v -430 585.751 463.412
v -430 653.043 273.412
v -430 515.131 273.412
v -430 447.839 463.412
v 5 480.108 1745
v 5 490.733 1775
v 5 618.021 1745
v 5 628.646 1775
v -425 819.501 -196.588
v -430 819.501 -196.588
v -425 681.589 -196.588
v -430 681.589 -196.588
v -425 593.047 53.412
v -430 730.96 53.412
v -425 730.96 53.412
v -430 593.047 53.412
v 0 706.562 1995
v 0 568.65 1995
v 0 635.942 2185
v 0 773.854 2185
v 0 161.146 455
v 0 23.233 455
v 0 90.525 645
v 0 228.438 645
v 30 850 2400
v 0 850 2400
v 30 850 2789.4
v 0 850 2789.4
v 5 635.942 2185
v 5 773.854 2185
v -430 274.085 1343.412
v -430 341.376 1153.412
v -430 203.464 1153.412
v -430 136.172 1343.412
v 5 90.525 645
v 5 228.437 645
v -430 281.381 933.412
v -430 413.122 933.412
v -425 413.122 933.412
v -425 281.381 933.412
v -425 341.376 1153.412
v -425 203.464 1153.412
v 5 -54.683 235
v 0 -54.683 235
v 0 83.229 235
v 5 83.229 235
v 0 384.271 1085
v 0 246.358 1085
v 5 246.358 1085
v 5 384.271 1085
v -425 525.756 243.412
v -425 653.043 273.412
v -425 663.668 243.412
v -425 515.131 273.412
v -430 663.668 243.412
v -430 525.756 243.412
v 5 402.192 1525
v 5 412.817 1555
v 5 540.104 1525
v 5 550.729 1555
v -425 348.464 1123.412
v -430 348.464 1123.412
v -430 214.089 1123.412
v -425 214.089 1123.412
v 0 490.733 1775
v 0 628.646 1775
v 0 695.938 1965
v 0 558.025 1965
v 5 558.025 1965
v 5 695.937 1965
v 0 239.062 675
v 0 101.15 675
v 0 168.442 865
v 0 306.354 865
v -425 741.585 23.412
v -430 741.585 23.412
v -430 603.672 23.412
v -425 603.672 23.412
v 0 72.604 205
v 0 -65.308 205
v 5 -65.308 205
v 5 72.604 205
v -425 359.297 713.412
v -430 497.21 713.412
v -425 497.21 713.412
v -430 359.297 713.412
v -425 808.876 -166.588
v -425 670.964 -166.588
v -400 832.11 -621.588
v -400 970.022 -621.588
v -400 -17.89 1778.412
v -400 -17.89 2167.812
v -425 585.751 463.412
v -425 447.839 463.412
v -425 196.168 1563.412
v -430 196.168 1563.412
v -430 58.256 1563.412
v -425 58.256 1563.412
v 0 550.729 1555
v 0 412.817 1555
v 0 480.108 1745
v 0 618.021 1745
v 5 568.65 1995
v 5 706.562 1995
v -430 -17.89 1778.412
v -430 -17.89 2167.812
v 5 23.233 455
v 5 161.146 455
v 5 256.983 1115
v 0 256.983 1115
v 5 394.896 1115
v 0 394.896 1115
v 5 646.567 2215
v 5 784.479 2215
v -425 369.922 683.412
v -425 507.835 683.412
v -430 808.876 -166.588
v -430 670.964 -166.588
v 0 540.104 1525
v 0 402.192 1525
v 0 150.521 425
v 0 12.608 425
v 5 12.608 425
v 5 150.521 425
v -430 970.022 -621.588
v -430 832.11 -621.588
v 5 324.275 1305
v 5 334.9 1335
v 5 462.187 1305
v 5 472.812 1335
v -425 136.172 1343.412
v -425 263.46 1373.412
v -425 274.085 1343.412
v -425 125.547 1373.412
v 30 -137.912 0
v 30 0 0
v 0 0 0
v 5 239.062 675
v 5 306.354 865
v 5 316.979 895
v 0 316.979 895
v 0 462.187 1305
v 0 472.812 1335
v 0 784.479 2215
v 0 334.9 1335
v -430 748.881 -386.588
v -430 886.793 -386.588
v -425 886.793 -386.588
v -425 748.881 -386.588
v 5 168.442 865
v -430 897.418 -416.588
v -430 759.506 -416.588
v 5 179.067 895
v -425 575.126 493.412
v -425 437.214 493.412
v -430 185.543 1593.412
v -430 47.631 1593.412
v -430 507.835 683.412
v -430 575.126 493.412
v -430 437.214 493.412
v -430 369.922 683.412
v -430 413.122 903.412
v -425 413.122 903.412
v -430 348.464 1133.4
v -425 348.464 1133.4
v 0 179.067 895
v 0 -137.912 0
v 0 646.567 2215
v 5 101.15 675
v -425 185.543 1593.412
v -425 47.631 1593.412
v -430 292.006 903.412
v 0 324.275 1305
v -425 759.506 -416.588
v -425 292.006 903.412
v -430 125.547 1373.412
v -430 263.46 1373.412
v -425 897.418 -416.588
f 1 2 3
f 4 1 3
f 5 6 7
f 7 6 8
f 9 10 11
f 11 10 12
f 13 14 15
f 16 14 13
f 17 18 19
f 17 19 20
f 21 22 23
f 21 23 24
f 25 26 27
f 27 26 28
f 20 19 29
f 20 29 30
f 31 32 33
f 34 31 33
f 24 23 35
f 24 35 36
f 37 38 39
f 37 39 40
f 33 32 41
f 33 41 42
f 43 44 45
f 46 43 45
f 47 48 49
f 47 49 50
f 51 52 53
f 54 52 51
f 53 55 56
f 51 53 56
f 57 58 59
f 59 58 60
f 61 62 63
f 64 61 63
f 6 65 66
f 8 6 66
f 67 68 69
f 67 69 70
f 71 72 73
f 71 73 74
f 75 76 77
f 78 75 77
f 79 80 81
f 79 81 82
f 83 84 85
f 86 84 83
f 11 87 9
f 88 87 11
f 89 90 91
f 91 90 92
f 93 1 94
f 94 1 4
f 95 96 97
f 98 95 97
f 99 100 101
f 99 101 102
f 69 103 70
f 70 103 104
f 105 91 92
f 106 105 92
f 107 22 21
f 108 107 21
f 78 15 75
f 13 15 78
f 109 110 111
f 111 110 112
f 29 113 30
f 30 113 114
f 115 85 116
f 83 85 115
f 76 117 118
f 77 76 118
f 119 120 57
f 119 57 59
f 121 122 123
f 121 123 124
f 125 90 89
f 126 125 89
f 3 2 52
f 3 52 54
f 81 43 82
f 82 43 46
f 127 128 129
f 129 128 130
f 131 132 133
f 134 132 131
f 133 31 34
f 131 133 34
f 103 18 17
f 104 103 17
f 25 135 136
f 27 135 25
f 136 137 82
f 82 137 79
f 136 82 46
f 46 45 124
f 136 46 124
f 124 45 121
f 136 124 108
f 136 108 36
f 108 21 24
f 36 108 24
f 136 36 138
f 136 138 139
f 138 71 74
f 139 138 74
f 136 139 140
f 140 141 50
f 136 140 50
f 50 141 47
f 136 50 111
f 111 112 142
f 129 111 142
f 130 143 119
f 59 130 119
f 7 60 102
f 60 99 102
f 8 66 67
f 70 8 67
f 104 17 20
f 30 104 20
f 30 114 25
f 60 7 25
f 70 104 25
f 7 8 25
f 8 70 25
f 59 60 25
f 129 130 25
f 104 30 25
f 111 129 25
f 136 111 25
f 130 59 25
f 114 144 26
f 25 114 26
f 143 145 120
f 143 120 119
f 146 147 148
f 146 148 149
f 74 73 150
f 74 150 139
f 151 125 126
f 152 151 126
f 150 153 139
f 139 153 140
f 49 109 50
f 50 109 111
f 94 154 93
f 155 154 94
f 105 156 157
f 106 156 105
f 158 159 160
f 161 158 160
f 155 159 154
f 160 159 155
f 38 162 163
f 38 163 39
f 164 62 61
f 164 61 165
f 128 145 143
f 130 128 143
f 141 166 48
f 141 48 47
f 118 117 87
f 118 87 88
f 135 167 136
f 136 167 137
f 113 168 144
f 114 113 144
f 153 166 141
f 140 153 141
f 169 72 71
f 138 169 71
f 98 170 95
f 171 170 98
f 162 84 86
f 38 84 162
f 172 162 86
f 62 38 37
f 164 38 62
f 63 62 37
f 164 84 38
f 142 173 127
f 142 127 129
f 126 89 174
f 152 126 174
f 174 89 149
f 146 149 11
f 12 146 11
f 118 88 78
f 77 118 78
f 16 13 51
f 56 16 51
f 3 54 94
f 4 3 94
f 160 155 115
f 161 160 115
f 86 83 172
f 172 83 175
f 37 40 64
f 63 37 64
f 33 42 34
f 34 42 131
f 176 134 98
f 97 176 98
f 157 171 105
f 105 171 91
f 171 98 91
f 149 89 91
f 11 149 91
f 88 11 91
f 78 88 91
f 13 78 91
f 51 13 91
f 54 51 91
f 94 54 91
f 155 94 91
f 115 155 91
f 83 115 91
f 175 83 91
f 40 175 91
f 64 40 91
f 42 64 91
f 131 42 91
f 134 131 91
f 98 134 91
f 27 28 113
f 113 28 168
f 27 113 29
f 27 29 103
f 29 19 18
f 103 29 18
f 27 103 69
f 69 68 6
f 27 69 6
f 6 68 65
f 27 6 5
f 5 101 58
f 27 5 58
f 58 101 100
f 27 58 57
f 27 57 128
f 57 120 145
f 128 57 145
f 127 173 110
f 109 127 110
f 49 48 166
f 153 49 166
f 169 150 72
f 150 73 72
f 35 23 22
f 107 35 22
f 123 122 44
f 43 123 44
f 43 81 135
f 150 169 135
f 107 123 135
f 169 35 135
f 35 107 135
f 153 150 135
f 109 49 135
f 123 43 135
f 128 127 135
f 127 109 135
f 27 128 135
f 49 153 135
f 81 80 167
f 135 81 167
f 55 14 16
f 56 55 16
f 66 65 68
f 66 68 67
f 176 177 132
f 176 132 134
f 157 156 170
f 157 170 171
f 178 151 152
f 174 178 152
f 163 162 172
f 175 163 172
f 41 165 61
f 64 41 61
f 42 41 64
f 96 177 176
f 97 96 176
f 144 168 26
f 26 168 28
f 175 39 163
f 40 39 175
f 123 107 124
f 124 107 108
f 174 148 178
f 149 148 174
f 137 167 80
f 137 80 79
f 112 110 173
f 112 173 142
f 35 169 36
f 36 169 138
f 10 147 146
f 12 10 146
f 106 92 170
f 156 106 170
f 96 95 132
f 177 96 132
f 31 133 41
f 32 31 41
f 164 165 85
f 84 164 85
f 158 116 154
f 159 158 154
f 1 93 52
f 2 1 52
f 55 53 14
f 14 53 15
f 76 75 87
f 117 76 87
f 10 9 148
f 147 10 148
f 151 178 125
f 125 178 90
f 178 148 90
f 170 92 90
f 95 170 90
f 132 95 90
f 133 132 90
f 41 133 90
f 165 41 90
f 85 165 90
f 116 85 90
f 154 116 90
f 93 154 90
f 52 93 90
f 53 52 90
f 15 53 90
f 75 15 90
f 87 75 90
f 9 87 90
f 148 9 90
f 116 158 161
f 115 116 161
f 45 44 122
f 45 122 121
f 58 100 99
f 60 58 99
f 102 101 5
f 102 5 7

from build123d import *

# Parameters (mm, degrees)
F1_DEPTH  = 30
F2_W      = 250
F2_H      = 30
F2_W_2    = 234.575457871
F2_W_3    = 192.9415017366
F2_W_4    = 210.5176895857
F2_W_5    = 378.7932693958
F2_W_6    = 369.8027133942
F2_W_7    = 339.6961390972
F2_W_8    = 379.8424005508
F2_W_9    = 261.5640759468
F3_DEPTH  = 5
F6_DEPTH  = 30
F7_W      = 250
F7_H      = 30
F7_W_2    = 422.9962933395
F7_W_3    = 476.137507293
F7_W_4    = 411.4778074953
F7_W_5    = 423.6617717478
F7_W_6    = 250.9912997484
F7_W_7    = 268.522799015
F7_W_8    = 459.9343236122
F8_DEPTH  = 5
F9_W      = 278.933961407
F9_H      = 30
F10_DEPTH = 5


with BuildPart() as f1:
    # F0 (on Right) → F1 (new body)
    with BuildSketch(Plane.YZ):
        Polygon((850, 2789.3997687863), (-137.9124181118, 0), (0, 0), (850, 2400), align=None)
    extrude(amount=F1_DEPTH)

    # F2 (on face) → F3 (cut)
    with BuildSketch(Plane.YZ):
        with Locations((38.6135950685, 220)):
            Rectangle(F2_W, F2_H)
        with Locations((104.1569635272, 440)):
            Rectangle(F2_W, F2_H)
        with Locations((199.024643749, 660)):
            Rectangle(F2_W_2, F2_H)
        with Locations((236.8515357375, 880)):
            Rectangle(F2_W_3, F2_H)
        with Locations((315.3102472425, 1100)):
            Rectangle(F2_W_4, F2_H)
        with Locations((472.7641195059, 1320)):
            Rectangle(F2_W_5, F2_H)
        with Locations((518.2236433029, 1540)):
            Rectangle(F2_W_6, F2_H)
        with Locations((590.4171615839, 1760)):
            Rectangle(F2_W_7, F2_H)
        with Locations((687.6215338707, 1980)):
            Rectangle(F2_W_8, F2_H)
        with Locations((718.5953557491, 2200)):
            Rectangle(F2_W_9, F2_H)
    extrude(amount=F3_DEPTH, mode=Mode.SUBTRACT)


with BuildPart() as f6:
    # F5 (on offset) → F6 (new body)
    with BuildSketch(Plane(origin=(-400, 0, 0), x_dir=(0, -1, 0), z_dir=(-1, 0, 0))):
        Polygon((17.8902225808, 2167.8120785297), (-970.022195531, -621.5876902566), (-832.1097774192, -621.5876902566), (17.8902225808, 1778.4123097434), align=None)
    extrude(amount=F6_DEPTH)

    # F7 (on face) → F8 (cut)
    with BuildSketch(Plane(origin=(-430, 0, 0), x_dir=(0, -1, 0), z_dir=(-1, 0, 0))):
        with Locations((-807.6754808426, -401.5876902566)):
            Rectangle(F7_W, F7_H)
        with Locations((-736.1475229263, -181.5876902566)):
            Rectangle(F7_W, F7_H)
        with Locations((-736.4049607681, 38.4123097434)):
            Rectangle(F7_W_2, F7_H)
        with Locations((-651.1904837357, 258.4123097434)):
            Rectangle(F7_W_3, F7_H)
        with Locations((-554.2031245099, 478.4123097434)):
            Rectangle(F7_W_4, F7_H)
        with Locations((-486.4598529206, 698.4123097434)):
            Rectangle(F7_W_5, F7_H)
        with Locations((-287.626080215, 918.4123097434)):
            Rectangle(F7_W_6, F7_H)
        with Locations((-214.2028212547, 1138.4123097434)):
            Rectangle(F7_W_7, F7_H)
        with Locations((-204.9595301764, 1358.4123097434)):
            Rectangle(F7_W_8, F7_H)
    extrude(amount=-F8_DEPTH, mode=Mode.SUBTRACT)

    # F9 (on face) → F10 (cut)
    with BuildSketch(Plane(origin=(-430, 0, 0), x_dir=(0, -1, 0), z_dir=(-1, 0, 0))):
        with Locations((-96.3066720885, 1578.4123097434)):
            Rectangle(F9_W, F9_H)
    extrude(amount=-F10_DEPTH, mode=Mode.SUBTRACT)


solid = Compound([f1.part, f6.part])
